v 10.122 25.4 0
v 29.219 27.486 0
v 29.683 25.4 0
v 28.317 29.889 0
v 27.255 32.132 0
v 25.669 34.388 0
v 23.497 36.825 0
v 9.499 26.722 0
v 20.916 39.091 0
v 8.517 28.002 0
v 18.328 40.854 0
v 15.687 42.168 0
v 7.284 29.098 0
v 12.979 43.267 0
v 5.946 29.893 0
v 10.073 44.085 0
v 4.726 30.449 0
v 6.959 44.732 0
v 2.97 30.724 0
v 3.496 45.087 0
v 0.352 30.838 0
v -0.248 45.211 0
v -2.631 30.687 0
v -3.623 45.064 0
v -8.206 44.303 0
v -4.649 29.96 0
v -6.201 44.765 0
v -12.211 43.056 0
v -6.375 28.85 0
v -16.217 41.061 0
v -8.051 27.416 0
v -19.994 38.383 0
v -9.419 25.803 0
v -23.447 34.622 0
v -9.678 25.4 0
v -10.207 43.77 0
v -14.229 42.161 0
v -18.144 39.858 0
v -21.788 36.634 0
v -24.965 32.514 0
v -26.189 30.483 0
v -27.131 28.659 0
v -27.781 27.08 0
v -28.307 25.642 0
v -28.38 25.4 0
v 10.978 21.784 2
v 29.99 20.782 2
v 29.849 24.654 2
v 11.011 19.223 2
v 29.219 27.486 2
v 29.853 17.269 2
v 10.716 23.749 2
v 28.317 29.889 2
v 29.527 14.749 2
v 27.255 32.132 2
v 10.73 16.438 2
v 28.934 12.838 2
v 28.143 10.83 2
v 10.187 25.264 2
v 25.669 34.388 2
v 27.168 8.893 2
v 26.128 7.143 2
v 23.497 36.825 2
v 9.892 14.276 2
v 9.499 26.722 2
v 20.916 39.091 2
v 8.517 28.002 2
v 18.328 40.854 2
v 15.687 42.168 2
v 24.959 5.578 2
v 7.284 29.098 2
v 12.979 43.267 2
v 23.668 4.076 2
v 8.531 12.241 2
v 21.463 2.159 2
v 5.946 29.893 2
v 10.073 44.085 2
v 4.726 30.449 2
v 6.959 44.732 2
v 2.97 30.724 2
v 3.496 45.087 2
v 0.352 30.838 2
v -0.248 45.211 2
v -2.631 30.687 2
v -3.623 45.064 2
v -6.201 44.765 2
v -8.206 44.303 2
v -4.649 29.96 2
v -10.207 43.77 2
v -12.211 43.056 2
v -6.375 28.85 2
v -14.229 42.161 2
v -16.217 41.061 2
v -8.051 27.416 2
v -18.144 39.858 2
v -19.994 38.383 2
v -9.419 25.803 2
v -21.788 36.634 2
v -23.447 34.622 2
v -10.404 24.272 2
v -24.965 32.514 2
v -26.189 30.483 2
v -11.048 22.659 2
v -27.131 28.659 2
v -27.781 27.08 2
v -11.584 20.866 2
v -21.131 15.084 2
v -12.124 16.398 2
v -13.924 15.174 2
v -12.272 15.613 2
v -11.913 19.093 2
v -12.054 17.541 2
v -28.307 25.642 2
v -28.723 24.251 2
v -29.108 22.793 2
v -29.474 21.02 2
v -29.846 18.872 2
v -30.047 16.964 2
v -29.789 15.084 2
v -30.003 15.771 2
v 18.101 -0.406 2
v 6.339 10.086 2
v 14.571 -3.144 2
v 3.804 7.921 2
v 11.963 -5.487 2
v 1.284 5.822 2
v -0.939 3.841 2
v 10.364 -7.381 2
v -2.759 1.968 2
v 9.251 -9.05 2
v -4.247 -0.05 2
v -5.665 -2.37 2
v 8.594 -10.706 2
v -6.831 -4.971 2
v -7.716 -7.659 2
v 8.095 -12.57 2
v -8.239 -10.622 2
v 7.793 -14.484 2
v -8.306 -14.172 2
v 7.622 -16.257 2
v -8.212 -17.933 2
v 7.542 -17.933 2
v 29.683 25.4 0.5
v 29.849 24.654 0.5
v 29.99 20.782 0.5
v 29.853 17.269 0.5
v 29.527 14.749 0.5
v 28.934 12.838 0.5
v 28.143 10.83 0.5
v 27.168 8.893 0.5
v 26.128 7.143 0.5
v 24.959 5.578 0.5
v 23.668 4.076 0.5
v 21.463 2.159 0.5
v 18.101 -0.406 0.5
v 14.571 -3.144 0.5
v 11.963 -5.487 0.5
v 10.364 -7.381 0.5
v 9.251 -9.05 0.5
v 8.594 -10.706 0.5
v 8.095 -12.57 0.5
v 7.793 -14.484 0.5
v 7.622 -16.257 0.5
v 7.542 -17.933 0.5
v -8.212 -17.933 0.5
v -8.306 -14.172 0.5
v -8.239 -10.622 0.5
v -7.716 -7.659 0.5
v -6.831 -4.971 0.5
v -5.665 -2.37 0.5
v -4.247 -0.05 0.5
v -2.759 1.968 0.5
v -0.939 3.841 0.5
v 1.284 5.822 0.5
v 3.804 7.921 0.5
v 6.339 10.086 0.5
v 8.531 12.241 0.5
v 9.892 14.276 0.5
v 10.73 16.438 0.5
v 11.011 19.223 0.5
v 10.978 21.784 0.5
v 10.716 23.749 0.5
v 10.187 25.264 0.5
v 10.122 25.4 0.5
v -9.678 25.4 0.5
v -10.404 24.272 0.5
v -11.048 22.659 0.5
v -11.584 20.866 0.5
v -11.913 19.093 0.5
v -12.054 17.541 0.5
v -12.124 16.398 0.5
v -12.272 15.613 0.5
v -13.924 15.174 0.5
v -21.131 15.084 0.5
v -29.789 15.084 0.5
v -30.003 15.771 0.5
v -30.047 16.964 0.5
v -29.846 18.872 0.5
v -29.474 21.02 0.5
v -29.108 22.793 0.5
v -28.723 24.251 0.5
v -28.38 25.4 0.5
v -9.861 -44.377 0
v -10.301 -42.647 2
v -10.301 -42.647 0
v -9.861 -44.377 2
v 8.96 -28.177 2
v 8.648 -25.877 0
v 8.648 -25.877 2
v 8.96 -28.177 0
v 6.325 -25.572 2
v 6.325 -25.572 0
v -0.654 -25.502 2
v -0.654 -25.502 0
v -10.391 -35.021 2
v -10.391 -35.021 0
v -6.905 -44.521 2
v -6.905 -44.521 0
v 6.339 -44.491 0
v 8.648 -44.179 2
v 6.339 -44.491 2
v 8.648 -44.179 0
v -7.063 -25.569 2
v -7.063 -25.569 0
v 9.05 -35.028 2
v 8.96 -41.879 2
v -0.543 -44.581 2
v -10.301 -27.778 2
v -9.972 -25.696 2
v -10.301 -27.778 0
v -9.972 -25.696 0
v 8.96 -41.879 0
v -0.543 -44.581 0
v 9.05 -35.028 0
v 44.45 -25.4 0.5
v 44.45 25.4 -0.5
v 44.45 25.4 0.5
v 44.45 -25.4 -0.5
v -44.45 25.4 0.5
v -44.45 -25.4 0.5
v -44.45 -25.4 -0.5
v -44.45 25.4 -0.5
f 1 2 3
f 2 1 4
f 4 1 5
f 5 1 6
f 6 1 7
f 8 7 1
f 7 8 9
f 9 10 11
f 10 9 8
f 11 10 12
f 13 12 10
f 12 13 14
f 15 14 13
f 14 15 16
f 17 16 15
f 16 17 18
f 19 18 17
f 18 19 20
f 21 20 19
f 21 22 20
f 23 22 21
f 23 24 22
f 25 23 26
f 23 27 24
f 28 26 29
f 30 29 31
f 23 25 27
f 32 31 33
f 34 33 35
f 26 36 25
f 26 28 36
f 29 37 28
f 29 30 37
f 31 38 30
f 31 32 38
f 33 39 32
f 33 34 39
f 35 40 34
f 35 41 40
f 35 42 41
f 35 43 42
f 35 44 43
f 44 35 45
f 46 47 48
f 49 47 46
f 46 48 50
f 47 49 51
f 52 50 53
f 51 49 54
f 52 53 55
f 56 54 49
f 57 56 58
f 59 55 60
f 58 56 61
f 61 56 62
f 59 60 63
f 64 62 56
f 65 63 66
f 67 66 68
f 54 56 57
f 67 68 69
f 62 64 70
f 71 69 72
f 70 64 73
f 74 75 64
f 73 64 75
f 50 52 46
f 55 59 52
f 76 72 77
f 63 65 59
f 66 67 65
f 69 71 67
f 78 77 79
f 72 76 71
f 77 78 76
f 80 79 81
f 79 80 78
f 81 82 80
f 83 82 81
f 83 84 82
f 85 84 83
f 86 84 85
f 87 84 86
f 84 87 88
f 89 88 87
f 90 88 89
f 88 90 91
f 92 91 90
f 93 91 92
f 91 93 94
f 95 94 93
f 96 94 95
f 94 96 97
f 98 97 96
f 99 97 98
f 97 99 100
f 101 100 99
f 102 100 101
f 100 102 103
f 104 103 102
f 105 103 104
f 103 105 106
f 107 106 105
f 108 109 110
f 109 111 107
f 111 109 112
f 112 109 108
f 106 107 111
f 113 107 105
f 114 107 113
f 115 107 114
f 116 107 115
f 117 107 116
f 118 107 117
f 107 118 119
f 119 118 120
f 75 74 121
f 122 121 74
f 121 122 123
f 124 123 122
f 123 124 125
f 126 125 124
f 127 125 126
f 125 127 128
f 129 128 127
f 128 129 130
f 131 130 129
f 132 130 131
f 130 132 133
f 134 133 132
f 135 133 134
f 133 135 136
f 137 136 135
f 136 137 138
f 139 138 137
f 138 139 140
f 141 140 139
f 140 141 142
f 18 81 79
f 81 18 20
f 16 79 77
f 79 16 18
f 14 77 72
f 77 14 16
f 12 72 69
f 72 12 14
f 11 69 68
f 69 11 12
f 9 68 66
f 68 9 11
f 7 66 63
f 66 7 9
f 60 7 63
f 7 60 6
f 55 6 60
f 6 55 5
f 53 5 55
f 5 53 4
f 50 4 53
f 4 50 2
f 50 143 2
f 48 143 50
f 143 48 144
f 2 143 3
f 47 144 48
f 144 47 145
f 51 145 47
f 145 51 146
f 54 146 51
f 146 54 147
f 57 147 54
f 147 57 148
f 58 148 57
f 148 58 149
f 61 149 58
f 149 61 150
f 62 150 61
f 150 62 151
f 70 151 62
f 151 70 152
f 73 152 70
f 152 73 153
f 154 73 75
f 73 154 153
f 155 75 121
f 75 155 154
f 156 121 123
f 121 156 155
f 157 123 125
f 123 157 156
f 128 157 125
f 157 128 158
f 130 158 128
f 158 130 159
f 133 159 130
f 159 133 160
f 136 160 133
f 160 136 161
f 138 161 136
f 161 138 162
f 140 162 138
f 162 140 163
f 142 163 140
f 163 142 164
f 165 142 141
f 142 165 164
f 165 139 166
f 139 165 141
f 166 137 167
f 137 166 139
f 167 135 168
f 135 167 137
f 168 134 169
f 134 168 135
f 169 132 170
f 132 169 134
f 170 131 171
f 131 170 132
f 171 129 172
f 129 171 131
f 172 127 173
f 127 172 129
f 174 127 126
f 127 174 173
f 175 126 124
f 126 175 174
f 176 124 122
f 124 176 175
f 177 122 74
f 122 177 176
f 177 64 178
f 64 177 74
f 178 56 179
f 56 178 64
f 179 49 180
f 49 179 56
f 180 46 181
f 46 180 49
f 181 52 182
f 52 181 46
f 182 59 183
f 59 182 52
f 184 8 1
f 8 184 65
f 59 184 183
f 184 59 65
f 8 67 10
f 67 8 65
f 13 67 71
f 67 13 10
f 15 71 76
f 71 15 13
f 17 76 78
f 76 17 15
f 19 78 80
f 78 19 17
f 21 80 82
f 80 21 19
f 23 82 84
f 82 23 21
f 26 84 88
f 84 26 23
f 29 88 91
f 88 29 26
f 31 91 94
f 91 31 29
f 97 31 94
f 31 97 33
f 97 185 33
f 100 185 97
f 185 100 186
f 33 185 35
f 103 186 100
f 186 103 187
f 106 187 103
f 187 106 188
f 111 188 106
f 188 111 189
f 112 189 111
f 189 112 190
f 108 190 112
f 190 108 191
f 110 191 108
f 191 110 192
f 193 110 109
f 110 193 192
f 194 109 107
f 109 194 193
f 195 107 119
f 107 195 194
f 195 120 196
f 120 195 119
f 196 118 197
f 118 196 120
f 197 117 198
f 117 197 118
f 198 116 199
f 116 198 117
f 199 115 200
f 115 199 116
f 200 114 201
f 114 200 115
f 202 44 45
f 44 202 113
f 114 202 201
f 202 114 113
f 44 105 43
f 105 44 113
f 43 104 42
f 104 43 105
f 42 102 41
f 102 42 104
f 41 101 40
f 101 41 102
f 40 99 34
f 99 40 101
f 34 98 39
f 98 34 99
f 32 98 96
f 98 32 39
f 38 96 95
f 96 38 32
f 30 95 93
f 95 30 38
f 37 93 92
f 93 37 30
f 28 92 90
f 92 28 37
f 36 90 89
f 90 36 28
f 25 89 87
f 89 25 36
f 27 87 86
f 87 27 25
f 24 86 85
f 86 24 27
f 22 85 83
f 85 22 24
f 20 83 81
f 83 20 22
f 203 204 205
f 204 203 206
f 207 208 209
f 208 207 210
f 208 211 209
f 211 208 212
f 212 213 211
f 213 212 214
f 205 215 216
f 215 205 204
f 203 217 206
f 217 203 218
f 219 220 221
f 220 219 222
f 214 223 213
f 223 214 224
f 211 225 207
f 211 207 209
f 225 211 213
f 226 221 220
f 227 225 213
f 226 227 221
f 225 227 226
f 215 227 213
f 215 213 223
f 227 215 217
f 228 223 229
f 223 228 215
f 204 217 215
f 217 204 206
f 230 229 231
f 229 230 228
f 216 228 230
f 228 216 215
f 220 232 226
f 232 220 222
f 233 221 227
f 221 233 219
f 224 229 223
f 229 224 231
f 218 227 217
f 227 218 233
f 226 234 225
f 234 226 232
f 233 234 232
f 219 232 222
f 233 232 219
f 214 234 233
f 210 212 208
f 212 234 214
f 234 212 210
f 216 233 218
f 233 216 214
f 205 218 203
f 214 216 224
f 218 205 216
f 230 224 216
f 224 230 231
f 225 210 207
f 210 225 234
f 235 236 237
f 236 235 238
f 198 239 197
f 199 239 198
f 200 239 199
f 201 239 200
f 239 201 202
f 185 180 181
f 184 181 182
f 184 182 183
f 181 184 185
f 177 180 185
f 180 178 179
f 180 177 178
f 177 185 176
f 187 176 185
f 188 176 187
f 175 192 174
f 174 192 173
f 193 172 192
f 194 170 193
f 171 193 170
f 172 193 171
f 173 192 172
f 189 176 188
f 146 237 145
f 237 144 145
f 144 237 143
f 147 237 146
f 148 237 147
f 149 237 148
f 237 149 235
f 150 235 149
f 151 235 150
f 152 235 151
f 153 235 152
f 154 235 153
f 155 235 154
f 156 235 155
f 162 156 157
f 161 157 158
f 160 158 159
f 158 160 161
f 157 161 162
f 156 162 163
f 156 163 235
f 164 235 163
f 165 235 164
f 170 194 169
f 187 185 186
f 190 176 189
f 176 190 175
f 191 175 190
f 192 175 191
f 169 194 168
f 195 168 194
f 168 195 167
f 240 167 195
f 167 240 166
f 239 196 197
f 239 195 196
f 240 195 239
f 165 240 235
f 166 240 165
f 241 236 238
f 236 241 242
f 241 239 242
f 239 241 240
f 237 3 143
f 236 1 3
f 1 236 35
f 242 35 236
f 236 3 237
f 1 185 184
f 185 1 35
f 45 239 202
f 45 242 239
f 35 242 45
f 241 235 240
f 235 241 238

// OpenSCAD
//------------------------------------------------------------
//	
//
//	input comes from:
//	http://chaaawa.com/stencil_factory/
//
//	
//	http://www.thingiverse.com/thing:55821
//------------------------------------------------------------

// preview[view:south, tilt:top]

// Go to: http://chaaawa.com/stencil_factory/, then paste here after "Convert&Copy".
input ="no_input";

stencil_thickness = 1;
stencil_width = 80;
margin = 10;

//If you don't want to center your design on the case
offX = 0;
offY = 0;
image_rotation =0; //[-180:180]

module void() {}

dispo_width = stencil_width - 2*margin;

points_array = (input=="no_input"? [[179,268],[[199.26,15.12],[189.19,15.56],[181.5,16.45],[175.52,17.83],[169.55,19.42],[163.57,21.55],[157.55,24.22],[151.62,27.5],[145.87,31.09],[140.35,35.49],[135,40.71],[130.05,46.71],[125.52,53],[121.87,59.06],[119.06,64.5],[117.12,69.21],[115.55,73.5],[114.31,77.65],[113.16,82],[112.07,87.29],[110.96,93.7],[110.36,99.39],[110.49,102.95],[111.13,105],[136.96,105],[158.46,104.73],[163.39,103.42],[163.83,101.08],[164.04,97.67],[164.46,93.04],[165.44,87.75],[167.04,82.4],[168.96,77.59],[171.9,73.02],[175.98,68.21],[180.98,63.93],[186.13,60.62],[192.15,58.45],[201.05,58],[208.86,58.34],[214.1,59.16],[217.74,60.82],[221.73,63.19],[225.41,66.46],[228.34,70.28],[230.39,74.63],[231.97,79.15],[232.75,85.01],[232.85,92.65],[232.01,100.96],[229.51,107.41],[225.45,113.48],[218.91,119.91],[211.35,126.37],[203.83,132.63],[197.2,138.54],[191.77,144.13],[187.33,150.15],[183.1,157.07],[179.62,164.83],[176.98,172.85],[175.42,181.69],[175.22,192.28],[175.5,203.5],[199,203.5],[222.5,203.5],[222.74,198.5],[223.25,193.21],[224.15,187.5],[225.64,181.94],[227.6,177],[230.92,172.02],[235.69,166.37],[243.47,159.38],[254,151.21],[264.03,143.56],[270.61,137.84],[274.46,133.36],[277.95,128.69],[281.05,123.47],[283.96,117.69],[286.32,111.7],[288.09,106],[289.06,98.48],[289.47,88],[289.05,76.45],[287.17,68],[284.48,60.83],[281.31,54.14],[276.58,47.41],[270.1,40.14],[262.4,33.38],[254.68,28.12],[246.8,24.2],[238.72,20.92],[230.05,18.48],[220.76,16.55],[210.43,15.49],[199.26,15.12]],[[198.05,226.08],[178.93,226.28],[170.25,226.66],[169.27,232.87],[169,254.48],[169.27,277.23],[170.58,282.39],[179.4,282.82],[198.38,283],[218.91,282.73],[225.8,281.8],[226.73,274.94],[227,254.5],[226.73,234.06],[225.8,227.2],[218.87,226.29],[198.05,226.08]]]: input);

input_width = points_array[0][0];
input_height= points_array[0][1];
sTrace = dispo_width/input_width;
stencil_height = input_height*sTrace + 2*margin;

cube([88.9,50.8,1], center=true);

difference() {
	translate([0, 0, stencil_thickness/2])
	translate([offX, offY, -stencil_thickness/2])
	rotate([0,0,image_rotation])
	scale([sTrace, -sTrace, 1])
	translate([-200, -150, 0]) {
		union() {
			for (i = [1:len(points_array) -1] ) {
				linear_extrude(height=stencil_thickness*2) {polygon(points_array[i]);}
			}
		}
	}
}




